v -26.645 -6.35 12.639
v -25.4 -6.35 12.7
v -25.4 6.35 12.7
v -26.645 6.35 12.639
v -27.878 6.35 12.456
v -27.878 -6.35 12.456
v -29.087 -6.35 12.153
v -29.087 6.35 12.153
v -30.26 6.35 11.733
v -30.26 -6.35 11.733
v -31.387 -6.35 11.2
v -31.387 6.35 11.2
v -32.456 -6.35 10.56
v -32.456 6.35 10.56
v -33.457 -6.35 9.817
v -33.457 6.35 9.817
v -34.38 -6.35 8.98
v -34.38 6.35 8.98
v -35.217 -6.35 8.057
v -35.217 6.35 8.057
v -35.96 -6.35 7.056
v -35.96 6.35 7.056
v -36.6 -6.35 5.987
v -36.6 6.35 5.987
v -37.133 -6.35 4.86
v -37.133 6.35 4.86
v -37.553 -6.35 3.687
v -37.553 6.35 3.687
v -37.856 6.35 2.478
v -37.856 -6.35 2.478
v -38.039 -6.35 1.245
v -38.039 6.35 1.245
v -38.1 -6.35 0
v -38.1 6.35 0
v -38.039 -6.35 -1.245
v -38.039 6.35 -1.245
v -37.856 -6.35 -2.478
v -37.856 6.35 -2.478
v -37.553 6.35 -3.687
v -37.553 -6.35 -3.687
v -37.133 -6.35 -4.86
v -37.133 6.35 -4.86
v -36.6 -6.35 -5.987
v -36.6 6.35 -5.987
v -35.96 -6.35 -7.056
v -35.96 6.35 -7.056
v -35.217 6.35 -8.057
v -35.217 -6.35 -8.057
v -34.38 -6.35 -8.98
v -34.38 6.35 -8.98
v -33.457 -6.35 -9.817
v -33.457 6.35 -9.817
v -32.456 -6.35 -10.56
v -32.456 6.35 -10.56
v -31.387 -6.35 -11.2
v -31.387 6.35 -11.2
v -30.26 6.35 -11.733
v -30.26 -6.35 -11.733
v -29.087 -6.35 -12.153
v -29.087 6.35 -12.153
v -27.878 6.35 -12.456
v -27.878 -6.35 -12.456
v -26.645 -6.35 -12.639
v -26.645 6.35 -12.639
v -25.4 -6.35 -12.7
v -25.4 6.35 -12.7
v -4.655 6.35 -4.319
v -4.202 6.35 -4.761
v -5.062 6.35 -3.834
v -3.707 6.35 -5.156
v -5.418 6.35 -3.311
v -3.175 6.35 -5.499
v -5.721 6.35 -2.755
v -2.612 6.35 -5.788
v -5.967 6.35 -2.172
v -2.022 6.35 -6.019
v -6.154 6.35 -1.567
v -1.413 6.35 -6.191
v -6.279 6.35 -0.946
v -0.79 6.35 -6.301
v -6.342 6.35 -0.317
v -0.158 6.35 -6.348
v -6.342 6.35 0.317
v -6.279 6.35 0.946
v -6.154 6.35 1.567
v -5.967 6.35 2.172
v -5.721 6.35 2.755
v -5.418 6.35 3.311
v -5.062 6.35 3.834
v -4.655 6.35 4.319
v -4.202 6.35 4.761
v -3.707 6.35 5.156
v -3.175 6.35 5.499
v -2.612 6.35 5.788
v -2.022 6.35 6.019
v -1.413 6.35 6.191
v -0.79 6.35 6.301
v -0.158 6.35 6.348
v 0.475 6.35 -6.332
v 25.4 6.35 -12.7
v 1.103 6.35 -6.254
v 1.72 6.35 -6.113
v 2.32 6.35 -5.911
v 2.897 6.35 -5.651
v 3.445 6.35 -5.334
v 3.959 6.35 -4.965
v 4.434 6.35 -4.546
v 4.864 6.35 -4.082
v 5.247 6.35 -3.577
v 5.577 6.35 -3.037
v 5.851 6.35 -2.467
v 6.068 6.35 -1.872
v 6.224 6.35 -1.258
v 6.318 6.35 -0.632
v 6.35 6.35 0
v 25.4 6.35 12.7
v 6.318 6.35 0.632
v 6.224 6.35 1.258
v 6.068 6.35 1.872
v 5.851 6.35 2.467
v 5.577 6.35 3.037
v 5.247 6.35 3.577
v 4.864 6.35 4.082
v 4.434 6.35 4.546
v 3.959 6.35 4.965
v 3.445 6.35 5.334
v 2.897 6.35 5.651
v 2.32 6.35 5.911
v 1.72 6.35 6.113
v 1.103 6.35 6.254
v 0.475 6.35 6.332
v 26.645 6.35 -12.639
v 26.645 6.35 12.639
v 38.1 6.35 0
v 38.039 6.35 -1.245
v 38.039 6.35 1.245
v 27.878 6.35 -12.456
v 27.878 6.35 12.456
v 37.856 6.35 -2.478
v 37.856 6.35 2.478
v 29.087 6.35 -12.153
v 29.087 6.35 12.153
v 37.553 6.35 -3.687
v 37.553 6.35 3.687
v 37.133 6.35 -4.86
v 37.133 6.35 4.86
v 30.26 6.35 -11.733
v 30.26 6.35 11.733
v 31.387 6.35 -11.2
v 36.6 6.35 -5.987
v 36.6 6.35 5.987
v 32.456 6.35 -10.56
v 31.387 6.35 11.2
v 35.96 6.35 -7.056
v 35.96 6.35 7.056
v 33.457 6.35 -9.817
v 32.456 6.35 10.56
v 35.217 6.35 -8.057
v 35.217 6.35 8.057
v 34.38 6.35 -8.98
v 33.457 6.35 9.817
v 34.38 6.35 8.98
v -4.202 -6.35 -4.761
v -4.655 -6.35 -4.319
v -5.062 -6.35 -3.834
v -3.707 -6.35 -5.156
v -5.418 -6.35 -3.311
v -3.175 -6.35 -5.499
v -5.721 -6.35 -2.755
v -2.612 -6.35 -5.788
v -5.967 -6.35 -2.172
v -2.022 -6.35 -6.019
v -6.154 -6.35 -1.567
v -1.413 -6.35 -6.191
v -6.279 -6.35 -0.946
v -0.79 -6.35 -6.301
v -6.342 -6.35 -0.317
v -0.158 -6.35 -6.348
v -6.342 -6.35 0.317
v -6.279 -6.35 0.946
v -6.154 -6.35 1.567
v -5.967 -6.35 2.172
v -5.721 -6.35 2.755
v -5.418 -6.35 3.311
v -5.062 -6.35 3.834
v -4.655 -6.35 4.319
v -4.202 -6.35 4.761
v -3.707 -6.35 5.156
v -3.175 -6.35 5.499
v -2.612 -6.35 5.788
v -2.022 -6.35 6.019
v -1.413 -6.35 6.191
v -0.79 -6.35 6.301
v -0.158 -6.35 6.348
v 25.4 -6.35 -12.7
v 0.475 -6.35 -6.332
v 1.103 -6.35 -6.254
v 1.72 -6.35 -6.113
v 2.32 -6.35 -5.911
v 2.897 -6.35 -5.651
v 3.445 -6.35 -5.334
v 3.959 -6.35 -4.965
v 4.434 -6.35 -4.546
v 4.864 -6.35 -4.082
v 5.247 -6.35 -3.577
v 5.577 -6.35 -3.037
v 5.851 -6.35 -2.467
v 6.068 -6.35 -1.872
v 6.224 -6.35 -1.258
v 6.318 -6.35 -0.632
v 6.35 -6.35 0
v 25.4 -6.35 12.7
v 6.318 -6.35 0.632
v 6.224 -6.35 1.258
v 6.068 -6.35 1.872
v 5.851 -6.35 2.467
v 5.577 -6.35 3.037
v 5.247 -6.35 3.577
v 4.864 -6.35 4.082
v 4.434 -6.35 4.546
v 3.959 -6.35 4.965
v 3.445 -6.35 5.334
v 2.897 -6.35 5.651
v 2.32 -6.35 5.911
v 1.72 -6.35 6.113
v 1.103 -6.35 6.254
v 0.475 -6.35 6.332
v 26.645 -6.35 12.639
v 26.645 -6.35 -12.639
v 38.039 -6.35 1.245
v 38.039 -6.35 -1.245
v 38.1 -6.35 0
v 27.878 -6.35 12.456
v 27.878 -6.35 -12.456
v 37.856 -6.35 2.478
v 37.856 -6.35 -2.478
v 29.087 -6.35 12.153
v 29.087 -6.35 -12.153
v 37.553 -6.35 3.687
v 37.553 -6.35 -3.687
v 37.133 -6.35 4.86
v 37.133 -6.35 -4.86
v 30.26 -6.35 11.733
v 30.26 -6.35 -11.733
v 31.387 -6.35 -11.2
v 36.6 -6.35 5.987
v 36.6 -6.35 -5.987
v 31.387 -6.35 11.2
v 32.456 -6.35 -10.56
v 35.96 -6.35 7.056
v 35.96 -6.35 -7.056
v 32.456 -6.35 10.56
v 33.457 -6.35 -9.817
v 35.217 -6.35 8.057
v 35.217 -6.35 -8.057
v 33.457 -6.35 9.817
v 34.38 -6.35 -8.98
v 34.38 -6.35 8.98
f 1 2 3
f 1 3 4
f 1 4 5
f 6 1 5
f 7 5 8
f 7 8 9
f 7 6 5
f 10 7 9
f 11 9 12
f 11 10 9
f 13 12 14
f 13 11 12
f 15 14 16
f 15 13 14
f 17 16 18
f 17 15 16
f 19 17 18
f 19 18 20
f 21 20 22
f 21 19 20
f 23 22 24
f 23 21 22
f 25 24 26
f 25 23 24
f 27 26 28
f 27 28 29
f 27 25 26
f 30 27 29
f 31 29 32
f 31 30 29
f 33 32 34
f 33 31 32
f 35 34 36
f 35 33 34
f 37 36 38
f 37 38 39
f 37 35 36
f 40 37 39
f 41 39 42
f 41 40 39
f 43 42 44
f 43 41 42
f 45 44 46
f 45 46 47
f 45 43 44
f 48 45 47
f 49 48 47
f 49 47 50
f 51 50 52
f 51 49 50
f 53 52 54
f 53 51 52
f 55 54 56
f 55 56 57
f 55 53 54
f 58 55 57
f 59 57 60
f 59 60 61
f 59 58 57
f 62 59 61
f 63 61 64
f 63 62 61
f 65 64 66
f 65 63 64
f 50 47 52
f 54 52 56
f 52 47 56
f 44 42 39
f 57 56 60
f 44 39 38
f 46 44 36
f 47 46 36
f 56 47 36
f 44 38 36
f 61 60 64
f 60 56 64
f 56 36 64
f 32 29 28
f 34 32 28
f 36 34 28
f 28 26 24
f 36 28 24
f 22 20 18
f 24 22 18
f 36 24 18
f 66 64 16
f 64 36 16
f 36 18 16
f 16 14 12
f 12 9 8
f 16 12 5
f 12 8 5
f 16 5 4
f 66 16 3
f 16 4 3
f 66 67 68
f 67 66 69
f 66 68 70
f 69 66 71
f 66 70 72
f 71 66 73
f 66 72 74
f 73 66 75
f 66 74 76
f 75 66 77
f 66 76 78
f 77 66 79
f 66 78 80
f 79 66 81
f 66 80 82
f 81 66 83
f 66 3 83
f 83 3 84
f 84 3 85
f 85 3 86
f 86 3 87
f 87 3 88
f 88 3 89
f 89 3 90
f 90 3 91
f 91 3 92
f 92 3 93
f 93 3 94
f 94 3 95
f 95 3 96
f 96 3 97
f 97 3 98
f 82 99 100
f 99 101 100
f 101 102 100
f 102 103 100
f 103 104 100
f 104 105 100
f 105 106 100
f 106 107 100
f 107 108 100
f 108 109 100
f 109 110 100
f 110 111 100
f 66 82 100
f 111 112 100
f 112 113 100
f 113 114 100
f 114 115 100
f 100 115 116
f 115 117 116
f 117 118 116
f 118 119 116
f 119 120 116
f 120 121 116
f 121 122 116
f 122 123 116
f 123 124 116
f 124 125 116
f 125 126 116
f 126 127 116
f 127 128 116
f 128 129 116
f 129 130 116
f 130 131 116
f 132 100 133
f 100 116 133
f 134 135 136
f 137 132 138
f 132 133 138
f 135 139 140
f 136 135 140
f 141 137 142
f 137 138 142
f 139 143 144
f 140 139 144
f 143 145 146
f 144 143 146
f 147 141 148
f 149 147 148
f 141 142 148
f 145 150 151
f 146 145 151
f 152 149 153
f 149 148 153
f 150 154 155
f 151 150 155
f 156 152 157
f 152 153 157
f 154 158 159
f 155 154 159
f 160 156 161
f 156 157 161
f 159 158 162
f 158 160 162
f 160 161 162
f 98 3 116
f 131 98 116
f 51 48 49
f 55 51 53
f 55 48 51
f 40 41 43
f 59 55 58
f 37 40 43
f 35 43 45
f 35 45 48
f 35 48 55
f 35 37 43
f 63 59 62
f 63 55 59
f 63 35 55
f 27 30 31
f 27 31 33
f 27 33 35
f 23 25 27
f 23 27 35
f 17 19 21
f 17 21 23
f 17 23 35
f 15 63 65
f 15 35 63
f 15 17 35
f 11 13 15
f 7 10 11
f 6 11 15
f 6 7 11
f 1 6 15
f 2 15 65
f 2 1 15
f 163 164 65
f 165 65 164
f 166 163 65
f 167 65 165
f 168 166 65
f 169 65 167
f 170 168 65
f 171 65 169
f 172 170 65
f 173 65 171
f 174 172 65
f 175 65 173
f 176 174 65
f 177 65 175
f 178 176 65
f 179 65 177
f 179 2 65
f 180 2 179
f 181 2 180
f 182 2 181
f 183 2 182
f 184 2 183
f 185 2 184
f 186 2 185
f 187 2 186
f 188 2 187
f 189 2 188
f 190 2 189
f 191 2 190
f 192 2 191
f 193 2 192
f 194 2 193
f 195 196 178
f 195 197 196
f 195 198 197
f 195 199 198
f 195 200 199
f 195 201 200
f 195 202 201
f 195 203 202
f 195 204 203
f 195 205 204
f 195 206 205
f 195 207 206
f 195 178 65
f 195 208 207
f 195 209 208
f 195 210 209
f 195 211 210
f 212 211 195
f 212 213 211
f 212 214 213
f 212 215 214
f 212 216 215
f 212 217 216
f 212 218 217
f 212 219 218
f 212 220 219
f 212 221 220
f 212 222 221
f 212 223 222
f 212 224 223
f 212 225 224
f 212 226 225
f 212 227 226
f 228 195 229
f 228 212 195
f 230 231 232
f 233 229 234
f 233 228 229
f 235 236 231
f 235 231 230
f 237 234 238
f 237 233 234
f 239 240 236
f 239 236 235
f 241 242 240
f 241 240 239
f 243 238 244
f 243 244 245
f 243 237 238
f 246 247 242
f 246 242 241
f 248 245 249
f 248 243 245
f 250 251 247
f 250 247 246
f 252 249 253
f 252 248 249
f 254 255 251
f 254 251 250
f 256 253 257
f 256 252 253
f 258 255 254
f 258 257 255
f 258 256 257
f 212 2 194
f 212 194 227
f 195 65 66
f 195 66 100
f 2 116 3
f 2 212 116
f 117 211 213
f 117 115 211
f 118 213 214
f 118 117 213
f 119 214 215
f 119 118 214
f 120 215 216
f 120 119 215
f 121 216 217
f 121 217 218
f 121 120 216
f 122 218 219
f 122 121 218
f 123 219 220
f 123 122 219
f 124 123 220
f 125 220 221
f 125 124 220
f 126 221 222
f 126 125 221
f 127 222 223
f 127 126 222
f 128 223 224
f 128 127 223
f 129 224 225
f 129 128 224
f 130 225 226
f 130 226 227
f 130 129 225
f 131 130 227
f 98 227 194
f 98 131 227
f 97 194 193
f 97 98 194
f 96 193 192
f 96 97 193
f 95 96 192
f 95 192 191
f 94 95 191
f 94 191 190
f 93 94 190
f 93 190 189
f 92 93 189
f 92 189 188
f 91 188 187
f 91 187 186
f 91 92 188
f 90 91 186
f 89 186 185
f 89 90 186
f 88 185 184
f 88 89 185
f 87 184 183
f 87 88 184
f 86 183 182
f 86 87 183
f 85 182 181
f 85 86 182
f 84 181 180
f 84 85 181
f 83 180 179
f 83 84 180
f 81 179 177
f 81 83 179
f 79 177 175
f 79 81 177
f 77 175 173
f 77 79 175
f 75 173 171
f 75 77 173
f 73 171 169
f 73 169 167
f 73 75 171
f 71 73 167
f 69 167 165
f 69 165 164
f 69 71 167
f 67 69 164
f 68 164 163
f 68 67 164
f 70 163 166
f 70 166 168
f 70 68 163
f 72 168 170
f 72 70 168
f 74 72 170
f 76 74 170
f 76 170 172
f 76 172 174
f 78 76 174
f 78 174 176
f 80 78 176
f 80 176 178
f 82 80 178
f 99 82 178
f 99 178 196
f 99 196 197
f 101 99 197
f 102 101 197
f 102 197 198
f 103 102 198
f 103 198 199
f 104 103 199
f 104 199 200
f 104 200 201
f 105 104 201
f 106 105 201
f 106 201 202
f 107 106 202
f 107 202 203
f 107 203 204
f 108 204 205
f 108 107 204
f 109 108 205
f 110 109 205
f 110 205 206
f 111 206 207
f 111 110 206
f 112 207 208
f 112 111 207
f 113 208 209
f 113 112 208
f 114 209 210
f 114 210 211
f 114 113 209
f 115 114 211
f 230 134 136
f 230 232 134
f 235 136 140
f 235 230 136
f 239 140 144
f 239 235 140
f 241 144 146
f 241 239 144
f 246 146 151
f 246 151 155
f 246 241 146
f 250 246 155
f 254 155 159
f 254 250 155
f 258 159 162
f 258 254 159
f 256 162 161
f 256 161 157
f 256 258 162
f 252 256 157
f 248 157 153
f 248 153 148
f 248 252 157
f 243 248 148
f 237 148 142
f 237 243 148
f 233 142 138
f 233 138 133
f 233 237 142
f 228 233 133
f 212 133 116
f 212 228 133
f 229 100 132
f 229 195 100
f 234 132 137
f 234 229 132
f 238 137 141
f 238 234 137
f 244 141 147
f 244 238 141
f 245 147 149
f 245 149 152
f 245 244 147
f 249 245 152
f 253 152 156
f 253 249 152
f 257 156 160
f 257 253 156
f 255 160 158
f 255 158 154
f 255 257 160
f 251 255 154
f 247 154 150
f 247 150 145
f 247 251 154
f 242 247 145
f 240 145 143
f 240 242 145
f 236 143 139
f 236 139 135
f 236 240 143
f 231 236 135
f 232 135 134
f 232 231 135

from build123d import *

# Parameters (mm, degrees)
F0_R     = 6.35
F1_DEPTH = 6.35


with BuildPart() as f1:
    # F0 (on Front) → F1 (new body, symmetric)
    with BuildSketch(Plane.XZ):
        with BuildLine():
            Line((25.4, 12.7), (-25.4, 12.7))
            ThreePointArc((-25.4, 12.7), (-16.419744, 8.980256), (-12.7, 0))
            ThreePointArc((-12.7, 0), (-16.419744, -8.980256), (-25.4, -12.7))
            Line((-25.4, -12.7), (25.4, -12.7))
            ThreePointArc((25.4, -12.7), (12.7, 0), (25.4, 12.7))
        make_face()
        Circle(F0_R, mode=Mode.SUBTRACT)
        with BuildLine():
            ThreePointArc((38.1, 0), (34.380256, 8.980256), (25.4, 12.7))
            ThreePointArc((25.4, 12.7), (12.7, 0), (25.4, -12.7))
            ThreePointArc((25.4, -12.7), (34.380256, -8.980256), (38.1, 0))
        make_face()
        with BuildLine():
            ThreePointArc((-12.7, 0), (-16.419744, 8.980256), (-25.4, 12.7))
            ThreePointArc((-25.4, 12.7), (-38.1, 0), (-25.4, -12.7))
            ThreePointArc((-25.4, -12.7), (-16.419744, -8.980256), (-12.7, 0))
        make_face()
    extrude(amount=F1_DEPTH, both=True)


solid = f1.part
